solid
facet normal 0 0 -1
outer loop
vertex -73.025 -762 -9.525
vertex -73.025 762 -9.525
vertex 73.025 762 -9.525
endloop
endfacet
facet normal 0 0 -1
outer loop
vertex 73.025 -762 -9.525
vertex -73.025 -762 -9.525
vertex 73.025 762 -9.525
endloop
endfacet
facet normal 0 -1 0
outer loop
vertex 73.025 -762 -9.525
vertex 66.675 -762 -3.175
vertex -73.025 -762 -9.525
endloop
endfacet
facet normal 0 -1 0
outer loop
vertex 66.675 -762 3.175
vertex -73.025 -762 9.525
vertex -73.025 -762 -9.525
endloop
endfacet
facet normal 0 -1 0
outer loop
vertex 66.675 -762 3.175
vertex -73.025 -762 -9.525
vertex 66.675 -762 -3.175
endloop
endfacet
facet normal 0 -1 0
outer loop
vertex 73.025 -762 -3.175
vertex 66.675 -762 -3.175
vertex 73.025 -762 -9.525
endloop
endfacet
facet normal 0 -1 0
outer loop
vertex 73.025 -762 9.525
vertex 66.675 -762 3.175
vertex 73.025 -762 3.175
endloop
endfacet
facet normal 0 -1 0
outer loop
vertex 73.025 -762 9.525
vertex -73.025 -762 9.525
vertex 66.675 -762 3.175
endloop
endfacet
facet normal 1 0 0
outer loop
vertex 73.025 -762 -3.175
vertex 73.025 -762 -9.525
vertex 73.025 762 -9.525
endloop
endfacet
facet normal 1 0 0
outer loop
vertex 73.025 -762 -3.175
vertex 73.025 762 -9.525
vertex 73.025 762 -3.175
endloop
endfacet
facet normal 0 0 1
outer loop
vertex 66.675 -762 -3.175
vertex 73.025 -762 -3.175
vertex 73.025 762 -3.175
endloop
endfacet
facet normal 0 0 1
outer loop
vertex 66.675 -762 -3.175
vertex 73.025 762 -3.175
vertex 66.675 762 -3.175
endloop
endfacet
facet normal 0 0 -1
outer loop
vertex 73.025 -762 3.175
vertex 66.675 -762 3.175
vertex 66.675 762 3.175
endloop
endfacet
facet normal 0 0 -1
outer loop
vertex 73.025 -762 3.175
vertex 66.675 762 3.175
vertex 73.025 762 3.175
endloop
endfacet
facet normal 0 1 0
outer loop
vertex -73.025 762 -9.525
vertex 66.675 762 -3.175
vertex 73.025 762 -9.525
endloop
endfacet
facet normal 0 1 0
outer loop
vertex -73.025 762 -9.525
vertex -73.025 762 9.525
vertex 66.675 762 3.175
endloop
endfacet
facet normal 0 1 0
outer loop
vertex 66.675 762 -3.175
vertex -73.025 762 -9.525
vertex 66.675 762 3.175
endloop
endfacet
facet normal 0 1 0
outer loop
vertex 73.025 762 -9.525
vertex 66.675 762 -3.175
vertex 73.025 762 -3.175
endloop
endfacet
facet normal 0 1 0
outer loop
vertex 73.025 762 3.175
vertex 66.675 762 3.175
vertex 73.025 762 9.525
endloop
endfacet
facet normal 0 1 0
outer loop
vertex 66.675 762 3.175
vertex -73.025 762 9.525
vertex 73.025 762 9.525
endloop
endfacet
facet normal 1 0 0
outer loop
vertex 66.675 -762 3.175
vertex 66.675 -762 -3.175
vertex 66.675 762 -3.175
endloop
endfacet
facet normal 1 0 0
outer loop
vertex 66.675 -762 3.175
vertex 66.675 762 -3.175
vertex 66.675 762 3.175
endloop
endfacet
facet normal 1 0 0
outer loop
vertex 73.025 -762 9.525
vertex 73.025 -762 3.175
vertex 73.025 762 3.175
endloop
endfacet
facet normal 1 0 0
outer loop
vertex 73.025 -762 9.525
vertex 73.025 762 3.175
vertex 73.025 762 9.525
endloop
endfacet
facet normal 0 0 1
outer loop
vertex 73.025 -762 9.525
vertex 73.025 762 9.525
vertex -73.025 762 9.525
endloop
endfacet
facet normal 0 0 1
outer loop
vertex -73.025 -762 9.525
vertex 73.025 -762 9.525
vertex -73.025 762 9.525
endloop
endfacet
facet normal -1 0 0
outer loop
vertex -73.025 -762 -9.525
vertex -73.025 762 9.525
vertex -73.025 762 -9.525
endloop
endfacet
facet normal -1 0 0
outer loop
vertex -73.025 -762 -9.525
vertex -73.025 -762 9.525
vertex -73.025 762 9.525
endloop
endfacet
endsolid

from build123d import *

# Parameters (mm, degrees)
F0_W     = 6.35
F0_H     = 6.35
F1_DEPTH = 762


with BuildPart() as f1:
    # F0 (on Front) → F1 (new body, symmetric)
    with BuildSketch(Plane.XZ):
        Polygon((-73.025, -3.175), (-73.025, -9.525), (73.025, -9.525), (73.025, -3.175), (66.675, -3.175), (66.675, 3.175), (73.025, 3.175), (73.025, 9.525), (-73.025, 9.525), (-73.025, 3.175), (-66.675, 3.175), (-66.675, -3.175), align=None)
        with Locations((-69.85, 0)):
            Rectangle(F0_W, F0_H)
    extrude(amount=F1_DEPTH, both=True)


solid = f1.part
